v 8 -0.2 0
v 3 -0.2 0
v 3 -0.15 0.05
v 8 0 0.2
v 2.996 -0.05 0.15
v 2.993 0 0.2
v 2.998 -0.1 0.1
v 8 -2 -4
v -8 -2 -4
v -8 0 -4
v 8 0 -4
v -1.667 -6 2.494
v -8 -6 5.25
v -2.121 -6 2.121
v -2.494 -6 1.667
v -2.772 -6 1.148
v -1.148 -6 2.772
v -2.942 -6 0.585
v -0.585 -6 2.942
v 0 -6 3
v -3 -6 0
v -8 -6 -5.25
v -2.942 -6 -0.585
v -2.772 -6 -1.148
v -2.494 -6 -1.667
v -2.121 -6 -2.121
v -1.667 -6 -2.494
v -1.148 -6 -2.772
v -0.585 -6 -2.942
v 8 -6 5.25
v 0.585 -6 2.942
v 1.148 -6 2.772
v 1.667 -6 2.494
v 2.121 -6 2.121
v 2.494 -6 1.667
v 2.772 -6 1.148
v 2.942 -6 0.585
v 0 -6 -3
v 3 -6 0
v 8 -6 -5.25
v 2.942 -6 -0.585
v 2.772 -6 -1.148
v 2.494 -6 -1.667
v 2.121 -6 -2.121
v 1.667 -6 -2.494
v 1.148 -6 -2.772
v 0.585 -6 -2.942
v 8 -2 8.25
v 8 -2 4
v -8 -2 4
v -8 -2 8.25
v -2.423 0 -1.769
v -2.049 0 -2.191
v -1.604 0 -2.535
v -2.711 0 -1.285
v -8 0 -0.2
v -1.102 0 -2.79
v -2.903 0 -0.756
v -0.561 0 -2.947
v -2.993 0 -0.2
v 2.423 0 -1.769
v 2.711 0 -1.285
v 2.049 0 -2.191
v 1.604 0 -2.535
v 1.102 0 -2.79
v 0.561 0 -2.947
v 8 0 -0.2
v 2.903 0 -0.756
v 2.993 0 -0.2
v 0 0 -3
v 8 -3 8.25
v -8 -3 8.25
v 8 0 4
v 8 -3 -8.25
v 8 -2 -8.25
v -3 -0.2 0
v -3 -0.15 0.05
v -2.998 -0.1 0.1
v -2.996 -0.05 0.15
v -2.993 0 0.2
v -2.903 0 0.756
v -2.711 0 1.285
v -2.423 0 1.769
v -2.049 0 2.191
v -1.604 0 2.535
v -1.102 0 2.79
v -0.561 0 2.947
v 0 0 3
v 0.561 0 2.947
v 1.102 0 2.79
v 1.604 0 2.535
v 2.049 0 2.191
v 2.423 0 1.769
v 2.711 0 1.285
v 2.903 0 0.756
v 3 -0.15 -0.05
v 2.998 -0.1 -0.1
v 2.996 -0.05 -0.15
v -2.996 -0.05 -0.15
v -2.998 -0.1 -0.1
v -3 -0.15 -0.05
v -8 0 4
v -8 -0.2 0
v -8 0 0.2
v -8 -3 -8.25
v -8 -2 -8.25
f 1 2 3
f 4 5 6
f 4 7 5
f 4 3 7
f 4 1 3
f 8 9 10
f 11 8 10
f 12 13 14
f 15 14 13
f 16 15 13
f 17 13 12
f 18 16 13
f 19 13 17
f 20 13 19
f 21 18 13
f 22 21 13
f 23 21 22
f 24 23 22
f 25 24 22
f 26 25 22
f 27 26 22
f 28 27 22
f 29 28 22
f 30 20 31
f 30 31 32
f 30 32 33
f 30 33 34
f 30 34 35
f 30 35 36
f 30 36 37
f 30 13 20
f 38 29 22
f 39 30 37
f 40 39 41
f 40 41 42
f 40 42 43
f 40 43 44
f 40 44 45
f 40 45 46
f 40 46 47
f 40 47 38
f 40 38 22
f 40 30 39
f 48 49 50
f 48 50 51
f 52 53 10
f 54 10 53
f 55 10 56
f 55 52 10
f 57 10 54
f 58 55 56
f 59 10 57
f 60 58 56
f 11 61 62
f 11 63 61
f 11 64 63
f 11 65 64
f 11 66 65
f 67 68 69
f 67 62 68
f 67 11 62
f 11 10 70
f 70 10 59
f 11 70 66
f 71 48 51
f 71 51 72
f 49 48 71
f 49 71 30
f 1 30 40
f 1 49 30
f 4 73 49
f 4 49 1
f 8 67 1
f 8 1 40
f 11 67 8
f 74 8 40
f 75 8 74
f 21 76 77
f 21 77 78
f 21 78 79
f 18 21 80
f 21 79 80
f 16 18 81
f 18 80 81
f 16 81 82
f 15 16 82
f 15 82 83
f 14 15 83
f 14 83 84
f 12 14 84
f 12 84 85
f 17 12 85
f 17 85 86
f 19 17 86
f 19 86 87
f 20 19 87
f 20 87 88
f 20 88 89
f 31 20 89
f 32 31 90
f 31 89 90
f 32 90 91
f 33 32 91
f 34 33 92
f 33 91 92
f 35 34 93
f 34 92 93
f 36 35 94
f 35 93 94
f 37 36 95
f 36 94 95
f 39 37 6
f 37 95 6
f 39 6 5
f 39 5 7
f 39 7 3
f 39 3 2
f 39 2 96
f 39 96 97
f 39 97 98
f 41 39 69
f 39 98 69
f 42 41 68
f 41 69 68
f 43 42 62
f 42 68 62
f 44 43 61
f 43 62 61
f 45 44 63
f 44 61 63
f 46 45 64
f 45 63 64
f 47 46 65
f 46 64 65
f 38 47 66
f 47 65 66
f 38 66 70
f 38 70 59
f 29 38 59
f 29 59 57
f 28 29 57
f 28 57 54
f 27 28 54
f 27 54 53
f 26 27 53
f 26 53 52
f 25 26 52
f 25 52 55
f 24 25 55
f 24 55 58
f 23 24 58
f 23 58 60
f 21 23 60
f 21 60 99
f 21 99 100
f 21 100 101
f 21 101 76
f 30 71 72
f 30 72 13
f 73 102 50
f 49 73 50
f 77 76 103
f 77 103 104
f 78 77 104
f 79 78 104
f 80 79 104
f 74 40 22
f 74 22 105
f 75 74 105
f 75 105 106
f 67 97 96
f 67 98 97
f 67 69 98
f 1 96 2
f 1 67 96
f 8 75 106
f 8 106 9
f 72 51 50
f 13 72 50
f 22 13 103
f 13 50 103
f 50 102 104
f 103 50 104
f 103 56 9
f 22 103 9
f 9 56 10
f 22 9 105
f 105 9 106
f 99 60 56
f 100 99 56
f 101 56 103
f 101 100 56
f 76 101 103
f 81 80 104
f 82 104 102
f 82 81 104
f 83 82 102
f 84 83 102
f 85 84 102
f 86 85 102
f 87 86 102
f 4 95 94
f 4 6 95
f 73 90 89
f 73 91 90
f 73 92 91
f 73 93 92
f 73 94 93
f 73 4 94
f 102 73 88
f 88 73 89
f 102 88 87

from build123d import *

# Parameters (mm, degrees)
BOSS_EXTRUDE1_DEPTH          = 16
F_6_0_6_DIAMETER_HOLE1_D     = 6
F_6_0_6_DIAMETER_HOLE1_DEPTH = 6


with BuildPart() as part:
    # Sketch1 → Boss-Extrude1 (new body)
    with BuildSketch(Plane(origin=(8, 0, 0), x_dir=(0, 0, -1), z_dir=(1, 0, 0))):
        Polygon((-0.2, 0), (-4, 0), (-4, -2), (-8.25, -2), (-8.25, -3), (-5.25, -6), (5.25, -6), (8.25, -3), (8.25, -2), (4, -2), (4, 0), (0.2, 0), (0, -0.2), align=None)
    extrude(amount=-BOSS_EXTRUDE1_DEPTH)

    # Ø6.0 (6) Diameter Hole1
    with Locations(Plane.XZ.offset(6)):
        with Locations((0, 0)):
            Hole(F_6_0_6_DIAMETER_HOLE1_D / 2, depth=F_6_0_6_DIAMETER_HOLE1_DEPTH)


solid = part.part
